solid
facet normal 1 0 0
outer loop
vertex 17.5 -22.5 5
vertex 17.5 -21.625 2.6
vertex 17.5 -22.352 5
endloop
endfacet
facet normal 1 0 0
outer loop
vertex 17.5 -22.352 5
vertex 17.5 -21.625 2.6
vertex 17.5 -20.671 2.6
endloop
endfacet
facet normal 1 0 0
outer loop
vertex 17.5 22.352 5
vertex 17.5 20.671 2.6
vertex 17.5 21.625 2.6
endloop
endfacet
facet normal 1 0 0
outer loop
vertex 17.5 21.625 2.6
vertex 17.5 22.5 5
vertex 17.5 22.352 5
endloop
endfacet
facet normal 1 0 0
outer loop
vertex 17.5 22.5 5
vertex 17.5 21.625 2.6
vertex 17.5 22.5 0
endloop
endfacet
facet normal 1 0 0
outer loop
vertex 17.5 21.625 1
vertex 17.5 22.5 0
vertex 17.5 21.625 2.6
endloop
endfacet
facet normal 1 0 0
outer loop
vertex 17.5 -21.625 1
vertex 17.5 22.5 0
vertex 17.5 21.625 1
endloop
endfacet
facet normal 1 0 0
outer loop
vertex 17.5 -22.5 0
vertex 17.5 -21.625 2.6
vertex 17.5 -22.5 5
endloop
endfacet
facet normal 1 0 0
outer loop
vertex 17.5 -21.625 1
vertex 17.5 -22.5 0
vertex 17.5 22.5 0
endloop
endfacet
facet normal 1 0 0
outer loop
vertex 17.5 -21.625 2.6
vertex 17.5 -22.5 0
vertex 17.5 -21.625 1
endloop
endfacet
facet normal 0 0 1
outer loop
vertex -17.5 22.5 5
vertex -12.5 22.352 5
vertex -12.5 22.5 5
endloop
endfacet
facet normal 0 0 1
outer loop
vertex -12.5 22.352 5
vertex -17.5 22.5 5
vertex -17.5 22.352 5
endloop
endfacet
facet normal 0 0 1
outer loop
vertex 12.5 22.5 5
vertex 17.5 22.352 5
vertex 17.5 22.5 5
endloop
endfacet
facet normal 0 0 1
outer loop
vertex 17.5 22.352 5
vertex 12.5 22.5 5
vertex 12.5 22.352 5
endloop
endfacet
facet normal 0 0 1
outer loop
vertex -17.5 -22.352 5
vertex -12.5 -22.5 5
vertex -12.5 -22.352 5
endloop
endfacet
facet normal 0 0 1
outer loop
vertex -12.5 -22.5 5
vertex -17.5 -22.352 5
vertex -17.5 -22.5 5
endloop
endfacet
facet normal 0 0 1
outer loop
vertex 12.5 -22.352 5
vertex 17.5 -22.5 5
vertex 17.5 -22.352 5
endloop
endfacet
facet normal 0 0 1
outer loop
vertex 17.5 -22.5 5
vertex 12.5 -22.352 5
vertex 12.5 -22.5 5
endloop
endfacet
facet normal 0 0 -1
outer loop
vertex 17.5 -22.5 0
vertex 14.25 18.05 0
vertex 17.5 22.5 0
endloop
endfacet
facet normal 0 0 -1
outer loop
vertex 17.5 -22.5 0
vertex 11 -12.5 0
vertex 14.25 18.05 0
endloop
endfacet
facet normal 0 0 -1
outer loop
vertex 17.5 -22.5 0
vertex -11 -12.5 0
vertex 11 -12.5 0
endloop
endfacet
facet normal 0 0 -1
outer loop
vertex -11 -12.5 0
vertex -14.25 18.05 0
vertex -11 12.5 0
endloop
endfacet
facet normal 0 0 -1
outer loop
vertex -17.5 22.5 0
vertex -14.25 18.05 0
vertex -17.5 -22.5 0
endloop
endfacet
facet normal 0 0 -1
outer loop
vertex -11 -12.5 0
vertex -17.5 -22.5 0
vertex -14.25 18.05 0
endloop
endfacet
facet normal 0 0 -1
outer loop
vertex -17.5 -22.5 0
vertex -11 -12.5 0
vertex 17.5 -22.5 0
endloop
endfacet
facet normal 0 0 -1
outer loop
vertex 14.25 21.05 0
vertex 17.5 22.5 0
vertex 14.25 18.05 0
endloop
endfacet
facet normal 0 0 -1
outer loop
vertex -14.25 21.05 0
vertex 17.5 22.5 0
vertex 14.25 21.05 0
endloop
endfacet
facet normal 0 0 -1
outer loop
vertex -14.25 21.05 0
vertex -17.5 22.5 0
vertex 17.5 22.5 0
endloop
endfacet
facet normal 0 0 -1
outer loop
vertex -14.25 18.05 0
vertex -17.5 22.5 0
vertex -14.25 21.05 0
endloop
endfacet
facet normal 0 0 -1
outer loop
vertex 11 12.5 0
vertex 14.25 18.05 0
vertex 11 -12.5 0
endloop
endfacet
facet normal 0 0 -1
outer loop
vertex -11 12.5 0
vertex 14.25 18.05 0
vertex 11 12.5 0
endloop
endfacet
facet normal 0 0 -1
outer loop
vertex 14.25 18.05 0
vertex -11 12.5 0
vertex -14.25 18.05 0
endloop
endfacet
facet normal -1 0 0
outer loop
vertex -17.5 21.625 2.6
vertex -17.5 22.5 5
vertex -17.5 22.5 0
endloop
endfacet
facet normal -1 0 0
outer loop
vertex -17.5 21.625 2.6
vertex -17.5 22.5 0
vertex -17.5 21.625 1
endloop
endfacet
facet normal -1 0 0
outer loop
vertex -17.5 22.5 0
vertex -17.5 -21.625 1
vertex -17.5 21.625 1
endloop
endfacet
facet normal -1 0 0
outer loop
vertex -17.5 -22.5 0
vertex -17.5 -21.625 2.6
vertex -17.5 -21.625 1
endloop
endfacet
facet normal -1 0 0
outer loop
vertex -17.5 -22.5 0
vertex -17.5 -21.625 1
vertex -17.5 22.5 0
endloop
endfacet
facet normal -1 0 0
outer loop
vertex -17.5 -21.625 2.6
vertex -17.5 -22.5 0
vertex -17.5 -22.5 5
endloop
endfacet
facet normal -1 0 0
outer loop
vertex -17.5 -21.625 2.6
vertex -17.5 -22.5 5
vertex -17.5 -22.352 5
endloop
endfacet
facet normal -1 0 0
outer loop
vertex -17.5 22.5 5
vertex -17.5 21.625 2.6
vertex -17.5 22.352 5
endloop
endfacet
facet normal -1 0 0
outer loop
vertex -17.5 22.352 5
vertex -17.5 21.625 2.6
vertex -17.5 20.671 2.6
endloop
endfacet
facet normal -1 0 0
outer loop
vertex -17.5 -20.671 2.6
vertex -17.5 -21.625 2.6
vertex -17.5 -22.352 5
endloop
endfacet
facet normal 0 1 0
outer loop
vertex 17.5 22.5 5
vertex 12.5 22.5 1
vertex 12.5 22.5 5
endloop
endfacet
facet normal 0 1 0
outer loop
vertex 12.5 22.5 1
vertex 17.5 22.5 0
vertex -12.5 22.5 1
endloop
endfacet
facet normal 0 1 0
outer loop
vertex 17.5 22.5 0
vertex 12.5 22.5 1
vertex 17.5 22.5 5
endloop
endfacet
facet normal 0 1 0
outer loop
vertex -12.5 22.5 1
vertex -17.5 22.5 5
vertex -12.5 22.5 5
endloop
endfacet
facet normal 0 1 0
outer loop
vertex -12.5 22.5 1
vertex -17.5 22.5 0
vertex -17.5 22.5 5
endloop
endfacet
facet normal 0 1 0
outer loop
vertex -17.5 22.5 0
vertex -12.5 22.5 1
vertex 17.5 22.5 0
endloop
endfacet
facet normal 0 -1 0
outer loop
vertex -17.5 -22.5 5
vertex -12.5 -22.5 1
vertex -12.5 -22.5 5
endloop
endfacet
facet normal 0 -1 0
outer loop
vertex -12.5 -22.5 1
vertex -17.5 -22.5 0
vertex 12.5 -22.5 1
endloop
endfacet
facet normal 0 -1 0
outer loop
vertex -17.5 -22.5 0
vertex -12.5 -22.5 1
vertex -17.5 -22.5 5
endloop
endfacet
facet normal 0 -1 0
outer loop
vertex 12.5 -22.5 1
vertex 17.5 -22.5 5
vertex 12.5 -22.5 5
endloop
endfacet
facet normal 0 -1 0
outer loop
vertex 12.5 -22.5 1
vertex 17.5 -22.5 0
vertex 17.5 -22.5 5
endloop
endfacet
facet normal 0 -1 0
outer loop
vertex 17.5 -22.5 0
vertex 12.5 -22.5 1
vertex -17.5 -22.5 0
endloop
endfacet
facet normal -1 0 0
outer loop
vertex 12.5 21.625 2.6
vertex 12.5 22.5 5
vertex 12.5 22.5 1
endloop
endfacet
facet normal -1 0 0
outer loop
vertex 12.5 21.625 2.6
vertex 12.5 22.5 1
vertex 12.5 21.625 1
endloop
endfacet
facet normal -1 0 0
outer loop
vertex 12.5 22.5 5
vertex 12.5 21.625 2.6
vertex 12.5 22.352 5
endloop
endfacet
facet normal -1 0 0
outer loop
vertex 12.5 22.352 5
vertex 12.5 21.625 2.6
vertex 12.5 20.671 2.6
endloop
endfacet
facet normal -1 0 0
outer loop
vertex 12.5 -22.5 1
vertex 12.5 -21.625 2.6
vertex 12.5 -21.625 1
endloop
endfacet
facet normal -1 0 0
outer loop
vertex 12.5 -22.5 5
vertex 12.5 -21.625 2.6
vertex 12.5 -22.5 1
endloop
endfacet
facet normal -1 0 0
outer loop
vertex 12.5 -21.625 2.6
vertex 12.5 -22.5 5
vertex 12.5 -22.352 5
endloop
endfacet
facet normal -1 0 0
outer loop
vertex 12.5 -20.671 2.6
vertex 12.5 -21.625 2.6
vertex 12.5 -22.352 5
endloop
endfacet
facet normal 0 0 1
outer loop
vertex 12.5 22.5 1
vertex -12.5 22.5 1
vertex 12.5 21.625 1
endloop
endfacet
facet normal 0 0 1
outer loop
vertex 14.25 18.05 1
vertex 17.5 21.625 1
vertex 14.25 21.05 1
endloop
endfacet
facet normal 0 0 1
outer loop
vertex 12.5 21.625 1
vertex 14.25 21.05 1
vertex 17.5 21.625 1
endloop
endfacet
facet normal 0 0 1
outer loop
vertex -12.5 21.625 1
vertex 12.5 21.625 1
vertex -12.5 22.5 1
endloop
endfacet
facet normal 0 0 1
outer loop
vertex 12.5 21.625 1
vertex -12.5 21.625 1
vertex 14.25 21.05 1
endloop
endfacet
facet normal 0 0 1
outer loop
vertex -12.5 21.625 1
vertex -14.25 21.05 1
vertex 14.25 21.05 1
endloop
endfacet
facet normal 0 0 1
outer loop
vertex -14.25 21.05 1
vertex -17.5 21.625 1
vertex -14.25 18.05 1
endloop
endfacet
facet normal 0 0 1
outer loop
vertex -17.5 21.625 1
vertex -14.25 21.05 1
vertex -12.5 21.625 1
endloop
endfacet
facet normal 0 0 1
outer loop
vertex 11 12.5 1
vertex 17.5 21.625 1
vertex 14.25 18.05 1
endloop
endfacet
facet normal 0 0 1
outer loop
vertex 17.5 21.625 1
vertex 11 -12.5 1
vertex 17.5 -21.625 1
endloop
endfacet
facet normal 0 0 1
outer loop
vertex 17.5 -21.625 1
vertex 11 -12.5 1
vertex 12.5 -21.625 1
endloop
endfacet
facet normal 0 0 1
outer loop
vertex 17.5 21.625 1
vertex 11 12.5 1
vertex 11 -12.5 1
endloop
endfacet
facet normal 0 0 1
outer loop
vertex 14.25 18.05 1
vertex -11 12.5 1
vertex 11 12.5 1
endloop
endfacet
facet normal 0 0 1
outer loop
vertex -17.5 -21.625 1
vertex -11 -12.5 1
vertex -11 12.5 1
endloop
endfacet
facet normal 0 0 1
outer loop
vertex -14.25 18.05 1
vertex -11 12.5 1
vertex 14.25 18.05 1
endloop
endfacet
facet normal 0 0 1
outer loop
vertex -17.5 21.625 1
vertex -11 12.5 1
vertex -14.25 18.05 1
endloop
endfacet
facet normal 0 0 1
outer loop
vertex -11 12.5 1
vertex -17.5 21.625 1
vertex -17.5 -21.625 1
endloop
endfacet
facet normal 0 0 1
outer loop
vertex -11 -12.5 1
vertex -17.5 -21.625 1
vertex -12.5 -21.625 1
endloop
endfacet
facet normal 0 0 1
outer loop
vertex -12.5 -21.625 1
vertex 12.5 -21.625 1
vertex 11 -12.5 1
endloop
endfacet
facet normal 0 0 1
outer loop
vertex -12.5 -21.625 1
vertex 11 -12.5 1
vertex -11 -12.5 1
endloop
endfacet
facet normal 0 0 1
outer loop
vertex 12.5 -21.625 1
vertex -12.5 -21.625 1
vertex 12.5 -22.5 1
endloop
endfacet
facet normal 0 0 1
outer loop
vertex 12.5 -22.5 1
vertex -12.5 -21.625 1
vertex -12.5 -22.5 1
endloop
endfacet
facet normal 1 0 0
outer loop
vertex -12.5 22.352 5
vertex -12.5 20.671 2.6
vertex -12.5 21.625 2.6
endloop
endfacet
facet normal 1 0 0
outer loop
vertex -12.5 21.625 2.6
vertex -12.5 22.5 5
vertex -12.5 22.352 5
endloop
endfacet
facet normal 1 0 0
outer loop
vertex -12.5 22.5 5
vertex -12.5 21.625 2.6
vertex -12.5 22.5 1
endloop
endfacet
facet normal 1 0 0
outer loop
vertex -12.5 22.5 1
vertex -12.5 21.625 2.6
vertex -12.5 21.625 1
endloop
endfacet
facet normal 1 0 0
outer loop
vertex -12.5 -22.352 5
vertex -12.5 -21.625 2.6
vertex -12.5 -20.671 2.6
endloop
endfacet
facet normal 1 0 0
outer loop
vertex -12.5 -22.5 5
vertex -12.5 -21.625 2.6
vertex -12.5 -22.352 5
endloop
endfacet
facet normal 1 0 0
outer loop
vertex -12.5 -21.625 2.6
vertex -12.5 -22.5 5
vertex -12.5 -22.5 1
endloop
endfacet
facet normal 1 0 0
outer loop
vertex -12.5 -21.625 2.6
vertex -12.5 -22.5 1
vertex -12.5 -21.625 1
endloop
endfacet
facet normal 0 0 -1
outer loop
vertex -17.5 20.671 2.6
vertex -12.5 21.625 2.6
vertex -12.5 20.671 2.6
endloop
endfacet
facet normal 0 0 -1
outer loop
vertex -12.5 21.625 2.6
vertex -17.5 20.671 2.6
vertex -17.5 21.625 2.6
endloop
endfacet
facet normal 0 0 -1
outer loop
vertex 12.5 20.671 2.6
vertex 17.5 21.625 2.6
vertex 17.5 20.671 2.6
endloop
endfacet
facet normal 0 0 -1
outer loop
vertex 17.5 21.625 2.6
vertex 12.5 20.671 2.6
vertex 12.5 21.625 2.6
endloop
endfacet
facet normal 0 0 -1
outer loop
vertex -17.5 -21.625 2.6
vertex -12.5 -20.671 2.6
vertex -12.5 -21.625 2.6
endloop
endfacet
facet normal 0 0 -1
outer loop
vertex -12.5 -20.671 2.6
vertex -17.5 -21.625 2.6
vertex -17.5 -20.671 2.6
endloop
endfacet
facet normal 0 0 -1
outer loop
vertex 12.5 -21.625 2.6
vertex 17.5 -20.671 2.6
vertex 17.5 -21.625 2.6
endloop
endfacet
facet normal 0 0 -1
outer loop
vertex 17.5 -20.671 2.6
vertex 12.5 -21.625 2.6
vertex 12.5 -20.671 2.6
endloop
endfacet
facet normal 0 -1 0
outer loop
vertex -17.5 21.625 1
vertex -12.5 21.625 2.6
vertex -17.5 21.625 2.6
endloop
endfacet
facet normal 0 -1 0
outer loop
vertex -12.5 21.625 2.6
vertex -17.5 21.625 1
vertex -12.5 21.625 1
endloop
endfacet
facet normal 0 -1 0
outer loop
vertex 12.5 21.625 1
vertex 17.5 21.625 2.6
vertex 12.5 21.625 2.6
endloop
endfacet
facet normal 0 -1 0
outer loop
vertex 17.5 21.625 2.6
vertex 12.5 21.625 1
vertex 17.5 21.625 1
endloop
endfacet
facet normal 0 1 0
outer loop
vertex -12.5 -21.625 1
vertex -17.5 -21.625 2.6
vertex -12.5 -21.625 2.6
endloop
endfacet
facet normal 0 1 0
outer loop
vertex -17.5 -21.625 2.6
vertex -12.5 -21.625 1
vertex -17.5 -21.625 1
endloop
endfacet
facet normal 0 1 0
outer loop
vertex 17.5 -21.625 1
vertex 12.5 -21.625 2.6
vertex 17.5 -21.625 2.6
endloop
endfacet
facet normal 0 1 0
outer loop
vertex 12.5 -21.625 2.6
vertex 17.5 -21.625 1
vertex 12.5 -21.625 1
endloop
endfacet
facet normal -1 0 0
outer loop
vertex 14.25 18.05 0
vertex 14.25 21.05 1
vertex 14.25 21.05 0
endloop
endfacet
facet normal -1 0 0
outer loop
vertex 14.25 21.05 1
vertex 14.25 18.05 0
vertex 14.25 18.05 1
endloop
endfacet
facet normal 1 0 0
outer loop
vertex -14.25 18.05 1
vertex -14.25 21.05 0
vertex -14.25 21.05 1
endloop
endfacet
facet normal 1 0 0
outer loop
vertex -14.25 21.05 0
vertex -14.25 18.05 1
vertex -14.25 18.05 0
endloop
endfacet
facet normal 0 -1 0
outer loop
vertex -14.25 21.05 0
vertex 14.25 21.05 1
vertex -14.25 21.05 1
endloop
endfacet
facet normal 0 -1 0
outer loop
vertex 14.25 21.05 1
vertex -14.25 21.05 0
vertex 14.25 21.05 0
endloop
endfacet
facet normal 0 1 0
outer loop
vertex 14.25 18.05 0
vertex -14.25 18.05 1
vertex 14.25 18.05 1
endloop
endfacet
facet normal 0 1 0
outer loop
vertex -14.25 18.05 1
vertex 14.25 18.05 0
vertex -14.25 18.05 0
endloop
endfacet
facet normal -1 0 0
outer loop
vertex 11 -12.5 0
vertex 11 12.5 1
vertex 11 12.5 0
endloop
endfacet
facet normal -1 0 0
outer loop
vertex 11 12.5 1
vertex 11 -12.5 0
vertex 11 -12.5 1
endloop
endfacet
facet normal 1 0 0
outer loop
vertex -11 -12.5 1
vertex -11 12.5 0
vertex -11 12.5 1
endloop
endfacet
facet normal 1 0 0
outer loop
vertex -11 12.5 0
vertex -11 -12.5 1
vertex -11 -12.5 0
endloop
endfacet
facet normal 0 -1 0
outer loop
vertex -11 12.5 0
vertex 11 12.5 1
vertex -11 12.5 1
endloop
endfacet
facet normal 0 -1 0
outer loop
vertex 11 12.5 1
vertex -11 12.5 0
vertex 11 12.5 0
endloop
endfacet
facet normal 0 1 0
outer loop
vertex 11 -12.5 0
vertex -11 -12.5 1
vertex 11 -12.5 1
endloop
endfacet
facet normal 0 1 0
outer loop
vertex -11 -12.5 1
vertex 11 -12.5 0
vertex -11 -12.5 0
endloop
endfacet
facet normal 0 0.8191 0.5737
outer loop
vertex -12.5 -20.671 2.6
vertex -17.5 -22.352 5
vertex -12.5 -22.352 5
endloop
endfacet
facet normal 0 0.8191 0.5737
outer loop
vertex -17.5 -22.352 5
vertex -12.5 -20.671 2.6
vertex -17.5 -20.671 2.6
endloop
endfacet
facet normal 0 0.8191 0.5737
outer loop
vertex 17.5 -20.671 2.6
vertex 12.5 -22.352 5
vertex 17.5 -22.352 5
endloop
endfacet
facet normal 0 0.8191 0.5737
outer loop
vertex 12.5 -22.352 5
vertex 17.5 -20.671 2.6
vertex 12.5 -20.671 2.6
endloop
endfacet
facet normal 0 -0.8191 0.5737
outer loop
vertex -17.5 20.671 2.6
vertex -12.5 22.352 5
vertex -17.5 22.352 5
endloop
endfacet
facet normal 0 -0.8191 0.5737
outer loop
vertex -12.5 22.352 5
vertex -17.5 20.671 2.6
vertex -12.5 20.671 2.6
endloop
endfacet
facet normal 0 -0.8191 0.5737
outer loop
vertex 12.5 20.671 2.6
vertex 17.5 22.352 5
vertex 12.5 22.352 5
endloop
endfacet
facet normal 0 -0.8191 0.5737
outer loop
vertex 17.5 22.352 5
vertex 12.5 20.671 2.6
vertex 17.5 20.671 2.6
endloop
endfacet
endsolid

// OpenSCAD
//%projection(cut=true) 
//rotate([30,0,0]) 
//rotate([0,90,0]) translate([-100,-100,0]) import("keg.stl");
//difference(){
//  %rotate([0,0,90])
//  scale([4,4,4])
//  import("Keg1a.stl");
//  
//}
//$fn=360;

//difference(){
////intersection(){
//    model();
//    cylinder(d=80,h=57);
//}

//cube([30, 43.2, 1], center=true);
screen_mount();
module screen_mount(){
  difference(){
    translate([0,0,2.5]) cube([35,45,5], center=true);
    translate([0,0,3.5]) cube([25,50,5], center=true);
      
    translate([0,0,0.8+1]) cube([36,43.25,1.6], center=true);
      
    translate([0,43.2/2-0.55-1.5,0]) cube([28.5,3,5], center=true);
    cube([22,25,5], center=true);
    hull() for(Y=[-1,1])
      translate([0,Y*20,6]) rotate([55*Y,0,0]) cube([36,5,5], center=true);
  }
  
}

module model(){
difference(){
  body();
  translate([0,0,85]) cube([30,30,15], center=true);
  translate([0,0,10]) cylinder(d=60,h=68);
  translate([0,0,2]) cylinder(d1=38,d2=60,h=10);
  difference(){
    hull() for(Y=[-1,1])
      translate([0,5*Y,85]) rotate([0,90,0]) 
        cylinder(d=8, h=100, center=true);
    cylinder(d=60, h=100);
  }
  translate([0,-25,40]) cube([20,30,55], center=true);
//  cube(100);
}
}
module body(){
  rotate_extrude(angle=360) 
  difference(){
    rotate([0,0,90]) import("keg.dxf");
    square(100);
  }
}
module outline(){
projection(cut=true) rotate([90,0,0])
rotate([0,90,0])
  scale([4,4,4])
  import("Keg1a.stl");
}

//use <../PiZero.scad>
//translate([-10,-10,40]) rotate([0,90,0]){
//  PiZeroBody();
//  PiGPIO(1);
//}
